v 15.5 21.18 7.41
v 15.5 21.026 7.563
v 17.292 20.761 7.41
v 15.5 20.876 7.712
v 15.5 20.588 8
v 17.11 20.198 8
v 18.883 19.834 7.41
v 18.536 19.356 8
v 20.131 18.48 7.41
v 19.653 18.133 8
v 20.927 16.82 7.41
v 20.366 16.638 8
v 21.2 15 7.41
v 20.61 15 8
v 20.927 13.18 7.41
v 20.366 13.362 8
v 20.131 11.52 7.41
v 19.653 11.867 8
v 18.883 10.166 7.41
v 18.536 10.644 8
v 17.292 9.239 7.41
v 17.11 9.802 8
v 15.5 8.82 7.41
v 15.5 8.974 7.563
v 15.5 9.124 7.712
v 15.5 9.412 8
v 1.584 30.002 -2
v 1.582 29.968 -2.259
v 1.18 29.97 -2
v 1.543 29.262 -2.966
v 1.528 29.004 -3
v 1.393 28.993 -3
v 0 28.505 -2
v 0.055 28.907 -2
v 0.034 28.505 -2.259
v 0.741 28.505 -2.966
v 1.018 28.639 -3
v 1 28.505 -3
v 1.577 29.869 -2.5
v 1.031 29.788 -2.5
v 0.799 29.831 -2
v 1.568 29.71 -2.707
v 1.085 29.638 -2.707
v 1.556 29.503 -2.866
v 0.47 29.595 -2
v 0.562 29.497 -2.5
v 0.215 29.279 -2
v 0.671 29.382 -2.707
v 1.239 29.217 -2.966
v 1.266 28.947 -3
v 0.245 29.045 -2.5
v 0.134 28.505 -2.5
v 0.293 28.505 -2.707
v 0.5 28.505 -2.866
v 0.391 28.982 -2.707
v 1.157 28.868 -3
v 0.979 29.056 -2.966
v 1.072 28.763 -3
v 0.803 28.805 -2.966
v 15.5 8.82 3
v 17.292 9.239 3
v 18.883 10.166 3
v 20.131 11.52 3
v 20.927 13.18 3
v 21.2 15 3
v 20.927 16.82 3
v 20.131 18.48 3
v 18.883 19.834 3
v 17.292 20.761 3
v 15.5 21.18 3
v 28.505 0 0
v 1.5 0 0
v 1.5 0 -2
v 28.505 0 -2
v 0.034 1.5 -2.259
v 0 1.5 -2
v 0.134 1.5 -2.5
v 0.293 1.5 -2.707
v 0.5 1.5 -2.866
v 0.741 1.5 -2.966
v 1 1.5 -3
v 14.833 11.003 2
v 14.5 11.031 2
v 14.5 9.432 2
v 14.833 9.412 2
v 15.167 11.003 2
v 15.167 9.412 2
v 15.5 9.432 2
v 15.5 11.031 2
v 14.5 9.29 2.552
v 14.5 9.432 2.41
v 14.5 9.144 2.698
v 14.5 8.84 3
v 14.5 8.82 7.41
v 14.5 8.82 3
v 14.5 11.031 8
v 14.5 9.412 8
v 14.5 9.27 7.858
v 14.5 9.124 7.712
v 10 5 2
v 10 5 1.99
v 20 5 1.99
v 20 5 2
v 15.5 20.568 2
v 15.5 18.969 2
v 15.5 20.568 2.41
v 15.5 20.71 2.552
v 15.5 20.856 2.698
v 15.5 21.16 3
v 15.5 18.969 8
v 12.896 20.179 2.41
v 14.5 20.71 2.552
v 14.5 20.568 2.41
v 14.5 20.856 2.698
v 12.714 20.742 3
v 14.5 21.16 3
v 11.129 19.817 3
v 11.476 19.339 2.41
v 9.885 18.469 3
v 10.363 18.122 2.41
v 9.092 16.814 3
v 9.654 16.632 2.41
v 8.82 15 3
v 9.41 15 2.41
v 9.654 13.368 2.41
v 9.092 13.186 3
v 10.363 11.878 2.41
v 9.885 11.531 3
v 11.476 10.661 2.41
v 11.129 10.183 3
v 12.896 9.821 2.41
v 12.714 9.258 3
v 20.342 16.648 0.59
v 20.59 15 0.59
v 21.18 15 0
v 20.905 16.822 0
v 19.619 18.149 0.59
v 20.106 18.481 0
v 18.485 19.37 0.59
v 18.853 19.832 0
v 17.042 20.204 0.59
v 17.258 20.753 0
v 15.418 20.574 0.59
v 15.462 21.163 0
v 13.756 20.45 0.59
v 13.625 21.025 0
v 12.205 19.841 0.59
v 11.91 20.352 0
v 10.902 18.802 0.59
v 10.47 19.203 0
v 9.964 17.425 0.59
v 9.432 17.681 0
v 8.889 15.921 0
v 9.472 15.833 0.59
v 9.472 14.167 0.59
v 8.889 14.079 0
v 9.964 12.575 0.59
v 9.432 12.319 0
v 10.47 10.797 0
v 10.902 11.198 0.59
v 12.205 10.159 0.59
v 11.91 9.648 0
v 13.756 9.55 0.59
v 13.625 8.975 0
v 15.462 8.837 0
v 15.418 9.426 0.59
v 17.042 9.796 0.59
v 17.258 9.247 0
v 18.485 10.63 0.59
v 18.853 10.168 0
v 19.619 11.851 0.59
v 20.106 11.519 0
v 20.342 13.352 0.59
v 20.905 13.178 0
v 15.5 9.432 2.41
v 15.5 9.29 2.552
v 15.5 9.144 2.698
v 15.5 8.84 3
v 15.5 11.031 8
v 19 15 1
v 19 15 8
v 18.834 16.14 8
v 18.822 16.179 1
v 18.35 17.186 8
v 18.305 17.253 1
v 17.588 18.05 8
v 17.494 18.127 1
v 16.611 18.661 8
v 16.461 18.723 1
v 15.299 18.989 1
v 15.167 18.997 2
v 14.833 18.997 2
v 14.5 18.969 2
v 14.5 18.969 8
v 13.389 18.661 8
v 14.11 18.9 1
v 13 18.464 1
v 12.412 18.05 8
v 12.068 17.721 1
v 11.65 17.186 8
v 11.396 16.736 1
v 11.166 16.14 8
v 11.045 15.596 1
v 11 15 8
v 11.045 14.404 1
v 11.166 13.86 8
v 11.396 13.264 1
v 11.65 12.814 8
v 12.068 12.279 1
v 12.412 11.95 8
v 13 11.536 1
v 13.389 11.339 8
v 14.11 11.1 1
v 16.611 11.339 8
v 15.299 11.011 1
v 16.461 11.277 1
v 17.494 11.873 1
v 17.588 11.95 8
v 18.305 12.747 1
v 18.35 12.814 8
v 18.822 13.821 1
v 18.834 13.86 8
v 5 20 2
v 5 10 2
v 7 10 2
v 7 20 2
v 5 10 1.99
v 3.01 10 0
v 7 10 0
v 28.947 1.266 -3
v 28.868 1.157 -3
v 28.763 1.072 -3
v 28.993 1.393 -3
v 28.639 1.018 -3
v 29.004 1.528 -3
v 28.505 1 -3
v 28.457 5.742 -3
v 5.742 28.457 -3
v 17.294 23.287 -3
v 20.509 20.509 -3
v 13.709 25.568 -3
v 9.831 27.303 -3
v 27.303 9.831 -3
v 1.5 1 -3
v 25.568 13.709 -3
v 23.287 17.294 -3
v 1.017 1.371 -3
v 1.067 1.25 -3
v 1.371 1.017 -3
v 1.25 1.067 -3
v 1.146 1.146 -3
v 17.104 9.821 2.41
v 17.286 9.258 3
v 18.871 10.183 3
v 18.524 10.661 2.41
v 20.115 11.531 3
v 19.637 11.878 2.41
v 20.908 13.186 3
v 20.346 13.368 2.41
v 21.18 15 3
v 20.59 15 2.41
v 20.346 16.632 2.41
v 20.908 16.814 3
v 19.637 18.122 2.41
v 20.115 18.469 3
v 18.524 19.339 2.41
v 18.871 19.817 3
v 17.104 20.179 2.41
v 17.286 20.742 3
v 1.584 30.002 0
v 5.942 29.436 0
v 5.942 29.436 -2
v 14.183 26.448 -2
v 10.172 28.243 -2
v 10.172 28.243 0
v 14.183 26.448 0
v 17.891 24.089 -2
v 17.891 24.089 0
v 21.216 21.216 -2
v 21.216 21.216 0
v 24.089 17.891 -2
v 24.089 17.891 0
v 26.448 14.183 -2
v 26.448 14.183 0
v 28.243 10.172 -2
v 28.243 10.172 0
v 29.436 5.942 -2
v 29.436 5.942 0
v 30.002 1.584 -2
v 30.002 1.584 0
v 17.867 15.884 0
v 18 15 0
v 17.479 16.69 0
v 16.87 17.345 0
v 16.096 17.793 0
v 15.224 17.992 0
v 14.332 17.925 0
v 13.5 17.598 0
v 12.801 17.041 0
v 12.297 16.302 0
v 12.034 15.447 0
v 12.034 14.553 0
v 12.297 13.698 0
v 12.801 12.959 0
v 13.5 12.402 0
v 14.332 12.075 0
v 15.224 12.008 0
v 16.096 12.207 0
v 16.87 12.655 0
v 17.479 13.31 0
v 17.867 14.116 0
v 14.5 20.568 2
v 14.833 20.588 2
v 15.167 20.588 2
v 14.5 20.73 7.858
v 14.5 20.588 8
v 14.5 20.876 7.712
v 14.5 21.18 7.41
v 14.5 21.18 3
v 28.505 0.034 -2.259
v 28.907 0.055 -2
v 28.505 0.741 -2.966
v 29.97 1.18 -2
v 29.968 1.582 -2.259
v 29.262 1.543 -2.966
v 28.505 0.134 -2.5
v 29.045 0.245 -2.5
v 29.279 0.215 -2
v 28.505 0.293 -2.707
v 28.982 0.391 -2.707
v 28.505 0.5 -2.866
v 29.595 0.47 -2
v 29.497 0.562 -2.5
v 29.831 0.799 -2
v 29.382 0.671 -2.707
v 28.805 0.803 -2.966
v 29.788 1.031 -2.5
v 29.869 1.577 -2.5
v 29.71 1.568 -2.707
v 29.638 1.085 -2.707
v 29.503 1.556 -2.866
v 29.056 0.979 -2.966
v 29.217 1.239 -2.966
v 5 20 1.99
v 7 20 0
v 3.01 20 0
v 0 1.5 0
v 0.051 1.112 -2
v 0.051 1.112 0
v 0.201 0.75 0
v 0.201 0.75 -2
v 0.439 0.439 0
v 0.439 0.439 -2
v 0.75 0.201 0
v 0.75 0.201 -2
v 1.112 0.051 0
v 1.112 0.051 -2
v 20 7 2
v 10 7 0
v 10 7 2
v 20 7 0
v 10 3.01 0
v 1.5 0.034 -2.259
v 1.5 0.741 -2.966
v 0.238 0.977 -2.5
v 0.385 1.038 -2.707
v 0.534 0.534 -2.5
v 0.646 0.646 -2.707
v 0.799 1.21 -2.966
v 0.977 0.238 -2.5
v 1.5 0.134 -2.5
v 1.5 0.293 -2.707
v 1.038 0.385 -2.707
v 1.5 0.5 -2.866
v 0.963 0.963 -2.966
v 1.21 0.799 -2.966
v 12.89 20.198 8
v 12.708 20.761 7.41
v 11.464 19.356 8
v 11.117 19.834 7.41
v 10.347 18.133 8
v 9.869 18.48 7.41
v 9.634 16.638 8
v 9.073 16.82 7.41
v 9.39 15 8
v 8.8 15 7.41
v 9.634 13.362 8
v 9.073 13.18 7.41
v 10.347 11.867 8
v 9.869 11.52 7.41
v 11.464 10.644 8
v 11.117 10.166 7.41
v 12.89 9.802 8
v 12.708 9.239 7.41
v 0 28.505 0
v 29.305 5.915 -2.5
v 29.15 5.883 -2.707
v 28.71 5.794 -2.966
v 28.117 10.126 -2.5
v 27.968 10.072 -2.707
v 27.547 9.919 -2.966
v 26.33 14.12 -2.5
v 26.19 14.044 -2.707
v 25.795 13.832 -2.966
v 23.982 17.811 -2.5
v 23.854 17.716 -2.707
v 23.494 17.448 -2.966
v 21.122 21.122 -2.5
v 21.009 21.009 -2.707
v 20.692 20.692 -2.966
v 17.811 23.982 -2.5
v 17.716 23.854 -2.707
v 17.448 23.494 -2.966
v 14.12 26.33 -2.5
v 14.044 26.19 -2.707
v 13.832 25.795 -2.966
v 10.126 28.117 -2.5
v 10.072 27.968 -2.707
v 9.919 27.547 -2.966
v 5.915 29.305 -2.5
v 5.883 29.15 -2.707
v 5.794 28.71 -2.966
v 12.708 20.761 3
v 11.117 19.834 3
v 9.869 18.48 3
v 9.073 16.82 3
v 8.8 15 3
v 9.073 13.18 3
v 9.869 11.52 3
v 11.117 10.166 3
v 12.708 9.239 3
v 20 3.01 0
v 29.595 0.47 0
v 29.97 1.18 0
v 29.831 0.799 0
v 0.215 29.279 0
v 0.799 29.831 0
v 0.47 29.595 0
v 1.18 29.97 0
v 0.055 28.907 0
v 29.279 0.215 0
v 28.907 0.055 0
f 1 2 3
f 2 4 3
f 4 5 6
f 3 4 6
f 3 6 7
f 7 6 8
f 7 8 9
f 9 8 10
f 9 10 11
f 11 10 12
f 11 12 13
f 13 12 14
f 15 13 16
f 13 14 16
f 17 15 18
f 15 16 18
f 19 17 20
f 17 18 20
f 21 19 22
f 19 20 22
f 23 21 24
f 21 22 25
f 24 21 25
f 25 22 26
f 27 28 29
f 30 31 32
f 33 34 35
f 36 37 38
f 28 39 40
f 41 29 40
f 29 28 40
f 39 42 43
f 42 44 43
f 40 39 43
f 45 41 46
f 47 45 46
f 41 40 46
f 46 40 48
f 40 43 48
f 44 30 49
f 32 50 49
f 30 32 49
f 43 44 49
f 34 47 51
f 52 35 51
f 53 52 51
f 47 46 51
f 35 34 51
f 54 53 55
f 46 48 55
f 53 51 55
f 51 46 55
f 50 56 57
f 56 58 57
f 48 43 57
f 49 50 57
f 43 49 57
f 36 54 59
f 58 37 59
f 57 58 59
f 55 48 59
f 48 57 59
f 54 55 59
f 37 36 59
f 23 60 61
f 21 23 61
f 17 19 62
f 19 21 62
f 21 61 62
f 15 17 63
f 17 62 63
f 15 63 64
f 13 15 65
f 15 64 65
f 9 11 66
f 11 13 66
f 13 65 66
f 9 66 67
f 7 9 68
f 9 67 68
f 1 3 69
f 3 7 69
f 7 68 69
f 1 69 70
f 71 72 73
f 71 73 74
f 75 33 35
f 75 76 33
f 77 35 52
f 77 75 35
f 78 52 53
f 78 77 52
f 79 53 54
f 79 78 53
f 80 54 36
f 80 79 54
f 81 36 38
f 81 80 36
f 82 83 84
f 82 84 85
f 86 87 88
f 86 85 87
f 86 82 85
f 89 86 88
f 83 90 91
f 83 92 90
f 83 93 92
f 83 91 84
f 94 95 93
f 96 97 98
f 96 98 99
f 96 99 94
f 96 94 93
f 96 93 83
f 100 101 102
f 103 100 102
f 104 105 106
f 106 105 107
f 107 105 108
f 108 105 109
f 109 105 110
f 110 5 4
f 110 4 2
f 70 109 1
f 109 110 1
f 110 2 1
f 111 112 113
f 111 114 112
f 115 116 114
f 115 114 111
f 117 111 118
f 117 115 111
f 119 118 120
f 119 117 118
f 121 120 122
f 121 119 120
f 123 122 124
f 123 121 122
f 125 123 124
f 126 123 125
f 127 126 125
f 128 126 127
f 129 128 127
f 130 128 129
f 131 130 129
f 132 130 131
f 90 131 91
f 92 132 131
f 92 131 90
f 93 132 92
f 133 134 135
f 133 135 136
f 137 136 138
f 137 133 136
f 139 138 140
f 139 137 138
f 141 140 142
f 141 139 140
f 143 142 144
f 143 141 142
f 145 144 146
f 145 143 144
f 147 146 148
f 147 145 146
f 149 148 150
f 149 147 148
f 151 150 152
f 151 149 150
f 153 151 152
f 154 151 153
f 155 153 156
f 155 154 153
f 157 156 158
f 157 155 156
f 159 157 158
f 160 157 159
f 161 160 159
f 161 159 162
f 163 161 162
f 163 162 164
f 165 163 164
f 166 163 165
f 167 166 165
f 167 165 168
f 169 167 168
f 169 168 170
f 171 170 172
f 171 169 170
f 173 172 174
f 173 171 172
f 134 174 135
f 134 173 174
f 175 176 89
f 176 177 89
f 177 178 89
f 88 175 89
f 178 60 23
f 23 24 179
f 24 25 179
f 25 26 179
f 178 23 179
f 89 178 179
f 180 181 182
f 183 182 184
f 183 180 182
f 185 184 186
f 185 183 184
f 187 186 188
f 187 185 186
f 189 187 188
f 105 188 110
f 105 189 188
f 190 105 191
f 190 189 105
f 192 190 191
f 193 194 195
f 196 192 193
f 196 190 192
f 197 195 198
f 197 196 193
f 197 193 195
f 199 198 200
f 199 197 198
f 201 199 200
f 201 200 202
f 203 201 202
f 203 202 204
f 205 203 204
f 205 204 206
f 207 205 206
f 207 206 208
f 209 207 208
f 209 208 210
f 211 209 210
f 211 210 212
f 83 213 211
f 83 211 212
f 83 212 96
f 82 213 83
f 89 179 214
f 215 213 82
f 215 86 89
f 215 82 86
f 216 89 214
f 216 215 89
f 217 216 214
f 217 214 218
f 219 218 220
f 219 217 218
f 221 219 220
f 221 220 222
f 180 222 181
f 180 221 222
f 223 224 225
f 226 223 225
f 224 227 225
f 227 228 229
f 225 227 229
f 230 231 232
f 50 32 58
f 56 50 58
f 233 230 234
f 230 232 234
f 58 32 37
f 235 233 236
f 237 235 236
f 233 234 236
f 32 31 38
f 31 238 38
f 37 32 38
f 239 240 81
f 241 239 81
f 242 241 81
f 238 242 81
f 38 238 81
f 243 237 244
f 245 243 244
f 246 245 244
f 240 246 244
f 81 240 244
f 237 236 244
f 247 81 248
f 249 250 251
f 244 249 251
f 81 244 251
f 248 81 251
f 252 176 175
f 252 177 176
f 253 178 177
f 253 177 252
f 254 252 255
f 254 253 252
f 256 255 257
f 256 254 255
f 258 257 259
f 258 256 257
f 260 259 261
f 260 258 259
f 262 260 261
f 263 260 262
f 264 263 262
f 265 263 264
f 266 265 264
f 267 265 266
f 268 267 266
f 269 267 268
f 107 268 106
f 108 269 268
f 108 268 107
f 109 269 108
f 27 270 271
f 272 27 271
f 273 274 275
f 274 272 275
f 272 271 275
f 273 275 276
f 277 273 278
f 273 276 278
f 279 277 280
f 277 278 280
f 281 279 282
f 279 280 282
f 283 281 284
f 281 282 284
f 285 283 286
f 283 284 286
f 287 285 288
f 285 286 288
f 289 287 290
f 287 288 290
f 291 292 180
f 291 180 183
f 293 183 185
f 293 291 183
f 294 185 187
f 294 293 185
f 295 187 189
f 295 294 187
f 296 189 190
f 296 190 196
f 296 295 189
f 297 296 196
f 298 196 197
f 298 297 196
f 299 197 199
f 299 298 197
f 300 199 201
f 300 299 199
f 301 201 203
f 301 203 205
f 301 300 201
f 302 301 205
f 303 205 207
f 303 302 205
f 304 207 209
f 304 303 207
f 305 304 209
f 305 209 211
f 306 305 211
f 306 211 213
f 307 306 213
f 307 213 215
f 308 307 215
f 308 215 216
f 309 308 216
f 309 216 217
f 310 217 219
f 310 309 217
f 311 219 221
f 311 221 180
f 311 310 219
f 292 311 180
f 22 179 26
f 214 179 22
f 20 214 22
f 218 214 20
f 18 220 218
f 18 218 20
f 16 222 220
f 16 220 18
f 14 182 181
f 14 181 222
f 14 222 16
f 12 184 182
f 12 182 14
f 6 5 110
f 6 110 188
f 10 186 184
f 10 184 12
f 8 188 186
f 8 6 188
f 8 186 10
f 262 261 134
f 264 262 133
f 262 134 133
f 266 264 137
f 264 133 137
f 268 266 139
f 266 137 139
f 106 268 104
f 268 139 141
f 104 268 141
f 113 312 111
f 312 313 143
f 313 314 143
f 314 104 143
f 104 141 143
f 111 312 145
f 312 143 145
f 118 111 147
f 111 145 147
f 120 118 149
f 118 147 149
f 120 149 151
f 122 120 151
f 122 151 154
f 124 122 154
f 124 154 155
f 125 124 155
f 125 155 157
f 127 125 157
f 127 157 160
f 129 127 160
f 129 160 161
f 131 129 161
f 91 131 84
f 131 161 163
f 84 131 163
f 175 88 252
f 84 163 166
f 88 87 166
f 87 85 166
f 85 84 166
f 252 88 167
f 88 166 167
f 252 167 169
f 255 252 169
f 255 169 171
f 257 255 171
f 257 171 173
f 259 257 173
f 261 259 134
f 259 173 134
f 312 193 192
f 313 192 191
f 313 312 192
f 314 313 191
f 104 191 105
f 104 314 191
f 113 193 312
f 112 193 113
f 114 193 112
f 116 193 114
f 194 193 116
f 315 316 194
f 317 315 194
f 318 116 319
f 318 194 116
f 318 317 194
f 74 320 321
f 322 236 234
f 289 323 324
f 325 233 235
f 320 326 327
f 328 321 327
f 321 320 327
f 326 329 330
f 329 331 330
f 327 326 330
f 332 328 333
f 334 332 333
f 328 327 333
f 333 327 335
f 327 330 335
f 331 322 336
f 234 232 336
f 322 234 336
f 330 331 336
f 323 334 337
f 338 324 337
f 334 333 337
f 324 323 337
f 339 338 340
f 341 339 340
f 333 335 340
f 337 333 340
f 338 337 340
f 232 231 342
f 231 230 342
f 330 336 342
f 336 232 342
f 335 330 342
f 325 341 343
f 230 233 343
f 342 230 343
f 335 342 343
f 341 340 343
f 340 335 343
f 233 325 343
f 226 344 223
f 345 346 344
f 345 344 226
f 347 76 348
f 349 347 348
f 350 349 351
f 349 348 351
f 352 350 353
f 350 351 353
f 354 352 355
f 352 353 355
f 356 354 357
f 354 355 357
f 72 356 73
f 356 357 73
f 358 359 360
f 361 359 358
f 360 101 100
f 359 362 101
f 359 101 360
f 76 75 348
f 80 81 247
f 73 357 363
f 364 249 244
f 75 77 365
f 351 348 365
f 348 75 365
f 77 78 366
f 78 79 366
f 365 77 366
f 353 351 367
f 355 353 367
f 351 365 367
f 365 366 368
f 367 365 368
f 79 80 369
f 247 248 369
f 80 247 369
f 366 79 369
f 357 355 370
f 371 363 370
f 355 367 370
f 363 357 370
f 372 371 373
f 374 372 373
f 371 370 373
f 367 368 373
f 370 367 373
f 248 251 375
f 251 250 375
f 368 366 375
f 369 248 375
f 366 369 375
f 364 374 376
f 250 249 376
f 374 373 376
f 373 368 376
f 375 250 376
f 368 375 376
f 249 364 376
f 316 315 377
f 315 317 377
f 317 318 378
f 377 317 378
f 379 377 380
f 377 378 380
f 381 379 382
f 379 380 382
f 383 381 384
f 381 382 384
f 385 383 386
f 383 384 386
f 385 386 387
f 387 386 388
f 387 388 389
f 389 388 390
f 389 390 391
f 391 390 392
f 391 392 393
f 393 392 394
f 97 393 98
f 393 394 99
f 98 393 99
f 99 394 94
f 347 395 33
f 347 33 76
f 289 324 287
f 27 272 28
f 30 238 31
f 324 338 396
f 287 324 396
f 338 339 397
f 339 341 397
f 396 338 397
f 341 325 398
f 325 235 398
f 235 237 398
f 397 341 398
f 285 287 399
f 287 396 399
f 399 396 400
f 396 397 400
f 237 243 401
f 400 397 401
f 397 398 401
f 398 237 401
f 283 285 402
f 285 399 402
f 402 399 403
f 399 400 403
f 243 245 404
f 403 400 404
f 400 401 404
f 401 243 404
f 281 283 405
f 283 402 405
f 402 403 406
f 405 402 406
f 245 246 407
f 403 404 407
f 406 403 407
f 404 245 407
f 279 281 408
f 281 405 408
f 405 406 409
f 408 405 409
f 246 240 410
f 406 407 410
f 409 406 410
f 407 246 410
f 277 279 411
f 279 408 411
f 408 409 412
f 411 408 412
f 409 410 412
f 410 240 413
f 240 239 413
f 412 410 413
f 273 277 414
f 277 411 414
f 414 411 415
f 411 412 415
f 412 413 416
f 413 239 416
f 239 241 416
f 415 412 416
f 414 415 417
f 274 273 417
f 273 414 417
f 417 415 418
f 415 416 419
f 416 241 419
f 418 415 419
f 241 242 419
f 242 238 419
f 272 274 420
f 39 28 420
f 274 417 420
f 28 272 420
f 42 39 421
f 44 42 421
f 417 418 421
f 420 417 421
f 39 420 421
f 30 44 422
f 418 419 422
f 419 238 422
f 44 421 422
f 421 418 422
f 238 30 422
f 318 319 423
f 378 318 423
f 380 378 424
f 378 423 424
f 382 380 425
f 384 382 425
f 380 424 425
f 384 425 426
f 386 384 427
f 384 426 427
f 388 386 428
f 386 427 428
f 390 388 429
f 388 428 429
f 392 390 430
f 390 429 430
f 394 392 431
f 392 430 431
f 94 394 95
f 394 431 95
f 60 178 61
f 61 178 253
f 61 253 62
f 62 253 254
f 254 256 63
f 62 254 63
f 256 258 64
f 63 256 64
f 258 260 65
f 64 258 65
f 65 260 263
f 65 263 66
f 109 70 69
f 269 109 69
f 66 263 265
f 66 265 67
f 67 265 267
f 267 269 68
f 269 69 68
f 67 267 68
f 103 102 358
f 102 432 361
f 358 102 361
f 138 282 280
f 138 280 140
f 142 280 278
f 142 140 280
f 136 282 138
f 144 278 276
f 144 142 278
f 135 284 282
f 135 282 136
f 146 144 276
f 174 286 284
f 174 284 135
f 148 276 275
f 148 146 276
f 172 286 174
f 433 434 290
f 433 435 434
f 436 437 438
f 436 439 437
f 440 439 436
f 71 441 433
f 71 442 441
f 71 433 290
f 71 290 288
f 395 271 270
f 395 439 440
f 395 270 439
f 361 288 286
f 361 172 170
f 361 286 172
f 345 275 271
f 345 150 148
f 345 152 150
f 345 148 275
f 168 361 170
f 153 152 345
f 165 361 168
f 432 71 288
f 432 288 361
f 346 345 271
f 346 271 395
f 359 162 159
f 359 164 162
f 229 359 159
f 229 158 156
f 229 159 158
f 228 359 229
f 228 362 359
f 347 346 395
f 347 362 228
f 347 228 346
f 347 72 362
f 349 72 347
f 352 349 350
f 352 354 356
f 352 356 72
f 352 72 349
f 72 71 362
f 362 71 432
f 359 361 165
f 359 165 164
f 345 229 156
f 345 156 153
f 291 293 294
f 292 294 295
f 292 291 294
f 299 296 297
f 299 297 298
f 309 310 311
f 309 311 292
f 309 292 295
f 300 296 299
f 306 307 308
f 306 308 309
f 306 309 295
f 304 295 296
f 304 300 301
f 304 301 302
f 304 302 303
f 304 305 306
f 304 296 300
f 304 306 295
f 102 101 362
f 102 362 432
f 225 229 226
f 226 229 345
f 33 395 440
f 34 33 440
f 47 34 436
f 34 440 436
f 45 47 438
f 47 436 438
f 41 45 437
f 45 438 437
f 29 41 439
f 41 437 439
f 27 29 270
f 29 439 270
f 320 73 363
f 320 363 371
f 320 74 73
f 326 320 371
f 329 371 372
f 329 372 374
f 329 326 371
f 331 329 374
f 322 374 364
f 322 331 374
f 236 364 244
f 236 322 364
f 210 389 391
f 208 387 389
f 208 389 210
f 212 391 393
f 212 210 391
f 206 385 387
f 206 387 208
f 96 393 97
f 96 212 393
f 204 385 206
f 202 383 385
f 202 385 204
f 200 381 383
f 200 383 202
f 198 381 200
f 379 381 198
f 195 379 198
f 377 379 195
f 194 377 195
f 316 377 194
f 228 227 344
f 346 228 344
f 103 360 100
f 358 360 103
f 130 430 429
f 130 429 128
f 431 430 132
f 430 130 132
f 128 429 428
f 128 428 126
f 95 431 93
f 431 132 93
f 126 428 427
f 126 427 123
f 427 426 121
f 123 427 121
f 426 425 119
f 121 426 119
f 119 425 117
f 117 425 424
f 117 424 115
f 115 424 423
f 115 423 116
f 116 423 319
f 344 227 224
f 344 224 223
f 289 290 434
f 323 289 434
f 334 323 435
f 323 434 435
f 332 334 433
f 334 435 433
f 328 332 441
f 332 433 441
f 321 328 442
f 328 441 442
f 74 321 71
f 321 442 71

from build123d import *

# Parameters (mm, degrees)
SKETCH_R        = 6.2
SKETCH_R_2      = 4
PAD_DEPTH       = 8
PAD001_DEPTH    = 3
FILLET_R        = 1.5
FILLET001_R     = 1
SKETCH002_W     = 2
SKETCH002_H     = 10
SKETCH002_W_2   = 10
SKETCH002_H_2   = 2
PAD002_DEPTH    = 2
CHAMFER_SIZE    = 1.99
SKETCH003_R     = 6.2
SKETCH003_R_2   = 5.59
POCKET_DEPTH    = 3
SKETCH004_W     = 1
SKETCH004_H     = 14
POCKET001_DEPTH = 6
CHAMFER001_SIZE = 0.59
CHAMFER004_SIZE = 1


with BuildPart() as part:
    # Sketch → Pad (new body)
    with BuildSketch(Plane.XY):
        with Locations((15, 15)):
            Circle(SKETCH_R)
        with Locations((15, 15)):
            Circle(SKETCH_R_2, mode=Mode.SUBTRACT)
    extrude(amount=PAD_DEPTH)

    # Sketch001 (on Face3 of Pad) → Pad001 (join)
    with BuildSketch(Plane(origin=(0, 0, 0), x_dir=(1, 0, 0), z_dir=(0, 0, -1))):
        with BuildLine():
            Line((0, -28.504743), (0, 0))
            Line((0, 0), (28.504743, 0))
            ThreePointArc((30.002374, -1.584264), (29.594788, -0.469562), (28.504743, 0))
            ThreePointArc((1.584264, -30.002374), (21.216341, -21.216341), (30.002374, -1.584264))
            ThreePointArc((0, -28.504743), (0.469562, -29.594788), (1.584264, -30.002374))
        make_face()
    extrude(amount=PAD001_DEPTH)

    # Fillet
    fillet_edges = [part.edges().sort_by_distance(p)[0] for p in [
        (0, 0, -1.5),
    ]]
    fillet(fillet_edges, radius=FILLET_R)

    # Fillet001
    fillet001_edges = [part.edges().sort_by_distance(p)[0] for p in [
        (0, 15.002371, -3),
        (0.43934, 0.43934, -3),
        (0.469562, 29.594788, -3),
        (15.002371, 0, -3),
        (21.216341, 21.216341, -3),
        (29.594788, 0.469562, -3),
    ]]
    fillet(fillet001_edges, radius=FILLET001_R)

    # Sketch002 (on Face4 of Fillet001) → Pad002 (join)
    with BuildSketch(Plane.XY):
        with Locations((6, 15)):
            Rectangle(SKETCH002_W, SKETCH002_H)
        with Locations((15, 6)):
            Rectangle(SKETCH002_W_2, SKETCH002_H_2)
    extrude(amount=PAD002_DEPTH)

    # Chamfer
    chamfer_edges = [part.edges().sort_by_distance(p)[0] for p in [
        (15, 5, 0),
        (5, 15, 0),
    ]]
    chamfer(chamfer_edges, length=CHAMFER_SIZE)

    # Sketch003 → Pocket (cut)
    with BuildSketch(Plane.XY):
        with Locations((15, 15)):
            Circle(SKETCH003_R)
        with Locations((15, 15)):
            Circle(SKETCH003_R_2, mode=Mode.SUBTRACT)
    extrude(amount=POCKET_DEPTH, mode=Mode.SUBTRACT)

    # Sketch004 (on Face32 of Pocket) → Pocket001 (cut)
    with BuildSketch(Plane.XY.offset(8)):
        with Locations((15, 15)):
            Rectangle(SKETCH004_W, SKETCH004_H)
    extrude(amount=-POCKET001_DEPTH, mode=Mode.SUBTRACT)

    # Chamfer001
    chamfer001_edges = [part.edges().sort_by_distance(p)[0] for p in [
        (19.557412, 19.20357, 8),
        (19.125718, 18.77181, 3),
        (9.41, 15, 3),
        (9.41, 15, 0),
        (8.8, 15, 8),
    ]]
    chamfer(chamfer001_edges, length=CHAMFER001_SIZE)

    # Chamfer004
    chamfer004_edges = [part.edges().sort_by_distance(p)[0] for p in [
        (11, 15, 0),
    ]]
    chamfer(chamfer004_edges, length=CHAMFER004_SIZE)


solid = part.part
